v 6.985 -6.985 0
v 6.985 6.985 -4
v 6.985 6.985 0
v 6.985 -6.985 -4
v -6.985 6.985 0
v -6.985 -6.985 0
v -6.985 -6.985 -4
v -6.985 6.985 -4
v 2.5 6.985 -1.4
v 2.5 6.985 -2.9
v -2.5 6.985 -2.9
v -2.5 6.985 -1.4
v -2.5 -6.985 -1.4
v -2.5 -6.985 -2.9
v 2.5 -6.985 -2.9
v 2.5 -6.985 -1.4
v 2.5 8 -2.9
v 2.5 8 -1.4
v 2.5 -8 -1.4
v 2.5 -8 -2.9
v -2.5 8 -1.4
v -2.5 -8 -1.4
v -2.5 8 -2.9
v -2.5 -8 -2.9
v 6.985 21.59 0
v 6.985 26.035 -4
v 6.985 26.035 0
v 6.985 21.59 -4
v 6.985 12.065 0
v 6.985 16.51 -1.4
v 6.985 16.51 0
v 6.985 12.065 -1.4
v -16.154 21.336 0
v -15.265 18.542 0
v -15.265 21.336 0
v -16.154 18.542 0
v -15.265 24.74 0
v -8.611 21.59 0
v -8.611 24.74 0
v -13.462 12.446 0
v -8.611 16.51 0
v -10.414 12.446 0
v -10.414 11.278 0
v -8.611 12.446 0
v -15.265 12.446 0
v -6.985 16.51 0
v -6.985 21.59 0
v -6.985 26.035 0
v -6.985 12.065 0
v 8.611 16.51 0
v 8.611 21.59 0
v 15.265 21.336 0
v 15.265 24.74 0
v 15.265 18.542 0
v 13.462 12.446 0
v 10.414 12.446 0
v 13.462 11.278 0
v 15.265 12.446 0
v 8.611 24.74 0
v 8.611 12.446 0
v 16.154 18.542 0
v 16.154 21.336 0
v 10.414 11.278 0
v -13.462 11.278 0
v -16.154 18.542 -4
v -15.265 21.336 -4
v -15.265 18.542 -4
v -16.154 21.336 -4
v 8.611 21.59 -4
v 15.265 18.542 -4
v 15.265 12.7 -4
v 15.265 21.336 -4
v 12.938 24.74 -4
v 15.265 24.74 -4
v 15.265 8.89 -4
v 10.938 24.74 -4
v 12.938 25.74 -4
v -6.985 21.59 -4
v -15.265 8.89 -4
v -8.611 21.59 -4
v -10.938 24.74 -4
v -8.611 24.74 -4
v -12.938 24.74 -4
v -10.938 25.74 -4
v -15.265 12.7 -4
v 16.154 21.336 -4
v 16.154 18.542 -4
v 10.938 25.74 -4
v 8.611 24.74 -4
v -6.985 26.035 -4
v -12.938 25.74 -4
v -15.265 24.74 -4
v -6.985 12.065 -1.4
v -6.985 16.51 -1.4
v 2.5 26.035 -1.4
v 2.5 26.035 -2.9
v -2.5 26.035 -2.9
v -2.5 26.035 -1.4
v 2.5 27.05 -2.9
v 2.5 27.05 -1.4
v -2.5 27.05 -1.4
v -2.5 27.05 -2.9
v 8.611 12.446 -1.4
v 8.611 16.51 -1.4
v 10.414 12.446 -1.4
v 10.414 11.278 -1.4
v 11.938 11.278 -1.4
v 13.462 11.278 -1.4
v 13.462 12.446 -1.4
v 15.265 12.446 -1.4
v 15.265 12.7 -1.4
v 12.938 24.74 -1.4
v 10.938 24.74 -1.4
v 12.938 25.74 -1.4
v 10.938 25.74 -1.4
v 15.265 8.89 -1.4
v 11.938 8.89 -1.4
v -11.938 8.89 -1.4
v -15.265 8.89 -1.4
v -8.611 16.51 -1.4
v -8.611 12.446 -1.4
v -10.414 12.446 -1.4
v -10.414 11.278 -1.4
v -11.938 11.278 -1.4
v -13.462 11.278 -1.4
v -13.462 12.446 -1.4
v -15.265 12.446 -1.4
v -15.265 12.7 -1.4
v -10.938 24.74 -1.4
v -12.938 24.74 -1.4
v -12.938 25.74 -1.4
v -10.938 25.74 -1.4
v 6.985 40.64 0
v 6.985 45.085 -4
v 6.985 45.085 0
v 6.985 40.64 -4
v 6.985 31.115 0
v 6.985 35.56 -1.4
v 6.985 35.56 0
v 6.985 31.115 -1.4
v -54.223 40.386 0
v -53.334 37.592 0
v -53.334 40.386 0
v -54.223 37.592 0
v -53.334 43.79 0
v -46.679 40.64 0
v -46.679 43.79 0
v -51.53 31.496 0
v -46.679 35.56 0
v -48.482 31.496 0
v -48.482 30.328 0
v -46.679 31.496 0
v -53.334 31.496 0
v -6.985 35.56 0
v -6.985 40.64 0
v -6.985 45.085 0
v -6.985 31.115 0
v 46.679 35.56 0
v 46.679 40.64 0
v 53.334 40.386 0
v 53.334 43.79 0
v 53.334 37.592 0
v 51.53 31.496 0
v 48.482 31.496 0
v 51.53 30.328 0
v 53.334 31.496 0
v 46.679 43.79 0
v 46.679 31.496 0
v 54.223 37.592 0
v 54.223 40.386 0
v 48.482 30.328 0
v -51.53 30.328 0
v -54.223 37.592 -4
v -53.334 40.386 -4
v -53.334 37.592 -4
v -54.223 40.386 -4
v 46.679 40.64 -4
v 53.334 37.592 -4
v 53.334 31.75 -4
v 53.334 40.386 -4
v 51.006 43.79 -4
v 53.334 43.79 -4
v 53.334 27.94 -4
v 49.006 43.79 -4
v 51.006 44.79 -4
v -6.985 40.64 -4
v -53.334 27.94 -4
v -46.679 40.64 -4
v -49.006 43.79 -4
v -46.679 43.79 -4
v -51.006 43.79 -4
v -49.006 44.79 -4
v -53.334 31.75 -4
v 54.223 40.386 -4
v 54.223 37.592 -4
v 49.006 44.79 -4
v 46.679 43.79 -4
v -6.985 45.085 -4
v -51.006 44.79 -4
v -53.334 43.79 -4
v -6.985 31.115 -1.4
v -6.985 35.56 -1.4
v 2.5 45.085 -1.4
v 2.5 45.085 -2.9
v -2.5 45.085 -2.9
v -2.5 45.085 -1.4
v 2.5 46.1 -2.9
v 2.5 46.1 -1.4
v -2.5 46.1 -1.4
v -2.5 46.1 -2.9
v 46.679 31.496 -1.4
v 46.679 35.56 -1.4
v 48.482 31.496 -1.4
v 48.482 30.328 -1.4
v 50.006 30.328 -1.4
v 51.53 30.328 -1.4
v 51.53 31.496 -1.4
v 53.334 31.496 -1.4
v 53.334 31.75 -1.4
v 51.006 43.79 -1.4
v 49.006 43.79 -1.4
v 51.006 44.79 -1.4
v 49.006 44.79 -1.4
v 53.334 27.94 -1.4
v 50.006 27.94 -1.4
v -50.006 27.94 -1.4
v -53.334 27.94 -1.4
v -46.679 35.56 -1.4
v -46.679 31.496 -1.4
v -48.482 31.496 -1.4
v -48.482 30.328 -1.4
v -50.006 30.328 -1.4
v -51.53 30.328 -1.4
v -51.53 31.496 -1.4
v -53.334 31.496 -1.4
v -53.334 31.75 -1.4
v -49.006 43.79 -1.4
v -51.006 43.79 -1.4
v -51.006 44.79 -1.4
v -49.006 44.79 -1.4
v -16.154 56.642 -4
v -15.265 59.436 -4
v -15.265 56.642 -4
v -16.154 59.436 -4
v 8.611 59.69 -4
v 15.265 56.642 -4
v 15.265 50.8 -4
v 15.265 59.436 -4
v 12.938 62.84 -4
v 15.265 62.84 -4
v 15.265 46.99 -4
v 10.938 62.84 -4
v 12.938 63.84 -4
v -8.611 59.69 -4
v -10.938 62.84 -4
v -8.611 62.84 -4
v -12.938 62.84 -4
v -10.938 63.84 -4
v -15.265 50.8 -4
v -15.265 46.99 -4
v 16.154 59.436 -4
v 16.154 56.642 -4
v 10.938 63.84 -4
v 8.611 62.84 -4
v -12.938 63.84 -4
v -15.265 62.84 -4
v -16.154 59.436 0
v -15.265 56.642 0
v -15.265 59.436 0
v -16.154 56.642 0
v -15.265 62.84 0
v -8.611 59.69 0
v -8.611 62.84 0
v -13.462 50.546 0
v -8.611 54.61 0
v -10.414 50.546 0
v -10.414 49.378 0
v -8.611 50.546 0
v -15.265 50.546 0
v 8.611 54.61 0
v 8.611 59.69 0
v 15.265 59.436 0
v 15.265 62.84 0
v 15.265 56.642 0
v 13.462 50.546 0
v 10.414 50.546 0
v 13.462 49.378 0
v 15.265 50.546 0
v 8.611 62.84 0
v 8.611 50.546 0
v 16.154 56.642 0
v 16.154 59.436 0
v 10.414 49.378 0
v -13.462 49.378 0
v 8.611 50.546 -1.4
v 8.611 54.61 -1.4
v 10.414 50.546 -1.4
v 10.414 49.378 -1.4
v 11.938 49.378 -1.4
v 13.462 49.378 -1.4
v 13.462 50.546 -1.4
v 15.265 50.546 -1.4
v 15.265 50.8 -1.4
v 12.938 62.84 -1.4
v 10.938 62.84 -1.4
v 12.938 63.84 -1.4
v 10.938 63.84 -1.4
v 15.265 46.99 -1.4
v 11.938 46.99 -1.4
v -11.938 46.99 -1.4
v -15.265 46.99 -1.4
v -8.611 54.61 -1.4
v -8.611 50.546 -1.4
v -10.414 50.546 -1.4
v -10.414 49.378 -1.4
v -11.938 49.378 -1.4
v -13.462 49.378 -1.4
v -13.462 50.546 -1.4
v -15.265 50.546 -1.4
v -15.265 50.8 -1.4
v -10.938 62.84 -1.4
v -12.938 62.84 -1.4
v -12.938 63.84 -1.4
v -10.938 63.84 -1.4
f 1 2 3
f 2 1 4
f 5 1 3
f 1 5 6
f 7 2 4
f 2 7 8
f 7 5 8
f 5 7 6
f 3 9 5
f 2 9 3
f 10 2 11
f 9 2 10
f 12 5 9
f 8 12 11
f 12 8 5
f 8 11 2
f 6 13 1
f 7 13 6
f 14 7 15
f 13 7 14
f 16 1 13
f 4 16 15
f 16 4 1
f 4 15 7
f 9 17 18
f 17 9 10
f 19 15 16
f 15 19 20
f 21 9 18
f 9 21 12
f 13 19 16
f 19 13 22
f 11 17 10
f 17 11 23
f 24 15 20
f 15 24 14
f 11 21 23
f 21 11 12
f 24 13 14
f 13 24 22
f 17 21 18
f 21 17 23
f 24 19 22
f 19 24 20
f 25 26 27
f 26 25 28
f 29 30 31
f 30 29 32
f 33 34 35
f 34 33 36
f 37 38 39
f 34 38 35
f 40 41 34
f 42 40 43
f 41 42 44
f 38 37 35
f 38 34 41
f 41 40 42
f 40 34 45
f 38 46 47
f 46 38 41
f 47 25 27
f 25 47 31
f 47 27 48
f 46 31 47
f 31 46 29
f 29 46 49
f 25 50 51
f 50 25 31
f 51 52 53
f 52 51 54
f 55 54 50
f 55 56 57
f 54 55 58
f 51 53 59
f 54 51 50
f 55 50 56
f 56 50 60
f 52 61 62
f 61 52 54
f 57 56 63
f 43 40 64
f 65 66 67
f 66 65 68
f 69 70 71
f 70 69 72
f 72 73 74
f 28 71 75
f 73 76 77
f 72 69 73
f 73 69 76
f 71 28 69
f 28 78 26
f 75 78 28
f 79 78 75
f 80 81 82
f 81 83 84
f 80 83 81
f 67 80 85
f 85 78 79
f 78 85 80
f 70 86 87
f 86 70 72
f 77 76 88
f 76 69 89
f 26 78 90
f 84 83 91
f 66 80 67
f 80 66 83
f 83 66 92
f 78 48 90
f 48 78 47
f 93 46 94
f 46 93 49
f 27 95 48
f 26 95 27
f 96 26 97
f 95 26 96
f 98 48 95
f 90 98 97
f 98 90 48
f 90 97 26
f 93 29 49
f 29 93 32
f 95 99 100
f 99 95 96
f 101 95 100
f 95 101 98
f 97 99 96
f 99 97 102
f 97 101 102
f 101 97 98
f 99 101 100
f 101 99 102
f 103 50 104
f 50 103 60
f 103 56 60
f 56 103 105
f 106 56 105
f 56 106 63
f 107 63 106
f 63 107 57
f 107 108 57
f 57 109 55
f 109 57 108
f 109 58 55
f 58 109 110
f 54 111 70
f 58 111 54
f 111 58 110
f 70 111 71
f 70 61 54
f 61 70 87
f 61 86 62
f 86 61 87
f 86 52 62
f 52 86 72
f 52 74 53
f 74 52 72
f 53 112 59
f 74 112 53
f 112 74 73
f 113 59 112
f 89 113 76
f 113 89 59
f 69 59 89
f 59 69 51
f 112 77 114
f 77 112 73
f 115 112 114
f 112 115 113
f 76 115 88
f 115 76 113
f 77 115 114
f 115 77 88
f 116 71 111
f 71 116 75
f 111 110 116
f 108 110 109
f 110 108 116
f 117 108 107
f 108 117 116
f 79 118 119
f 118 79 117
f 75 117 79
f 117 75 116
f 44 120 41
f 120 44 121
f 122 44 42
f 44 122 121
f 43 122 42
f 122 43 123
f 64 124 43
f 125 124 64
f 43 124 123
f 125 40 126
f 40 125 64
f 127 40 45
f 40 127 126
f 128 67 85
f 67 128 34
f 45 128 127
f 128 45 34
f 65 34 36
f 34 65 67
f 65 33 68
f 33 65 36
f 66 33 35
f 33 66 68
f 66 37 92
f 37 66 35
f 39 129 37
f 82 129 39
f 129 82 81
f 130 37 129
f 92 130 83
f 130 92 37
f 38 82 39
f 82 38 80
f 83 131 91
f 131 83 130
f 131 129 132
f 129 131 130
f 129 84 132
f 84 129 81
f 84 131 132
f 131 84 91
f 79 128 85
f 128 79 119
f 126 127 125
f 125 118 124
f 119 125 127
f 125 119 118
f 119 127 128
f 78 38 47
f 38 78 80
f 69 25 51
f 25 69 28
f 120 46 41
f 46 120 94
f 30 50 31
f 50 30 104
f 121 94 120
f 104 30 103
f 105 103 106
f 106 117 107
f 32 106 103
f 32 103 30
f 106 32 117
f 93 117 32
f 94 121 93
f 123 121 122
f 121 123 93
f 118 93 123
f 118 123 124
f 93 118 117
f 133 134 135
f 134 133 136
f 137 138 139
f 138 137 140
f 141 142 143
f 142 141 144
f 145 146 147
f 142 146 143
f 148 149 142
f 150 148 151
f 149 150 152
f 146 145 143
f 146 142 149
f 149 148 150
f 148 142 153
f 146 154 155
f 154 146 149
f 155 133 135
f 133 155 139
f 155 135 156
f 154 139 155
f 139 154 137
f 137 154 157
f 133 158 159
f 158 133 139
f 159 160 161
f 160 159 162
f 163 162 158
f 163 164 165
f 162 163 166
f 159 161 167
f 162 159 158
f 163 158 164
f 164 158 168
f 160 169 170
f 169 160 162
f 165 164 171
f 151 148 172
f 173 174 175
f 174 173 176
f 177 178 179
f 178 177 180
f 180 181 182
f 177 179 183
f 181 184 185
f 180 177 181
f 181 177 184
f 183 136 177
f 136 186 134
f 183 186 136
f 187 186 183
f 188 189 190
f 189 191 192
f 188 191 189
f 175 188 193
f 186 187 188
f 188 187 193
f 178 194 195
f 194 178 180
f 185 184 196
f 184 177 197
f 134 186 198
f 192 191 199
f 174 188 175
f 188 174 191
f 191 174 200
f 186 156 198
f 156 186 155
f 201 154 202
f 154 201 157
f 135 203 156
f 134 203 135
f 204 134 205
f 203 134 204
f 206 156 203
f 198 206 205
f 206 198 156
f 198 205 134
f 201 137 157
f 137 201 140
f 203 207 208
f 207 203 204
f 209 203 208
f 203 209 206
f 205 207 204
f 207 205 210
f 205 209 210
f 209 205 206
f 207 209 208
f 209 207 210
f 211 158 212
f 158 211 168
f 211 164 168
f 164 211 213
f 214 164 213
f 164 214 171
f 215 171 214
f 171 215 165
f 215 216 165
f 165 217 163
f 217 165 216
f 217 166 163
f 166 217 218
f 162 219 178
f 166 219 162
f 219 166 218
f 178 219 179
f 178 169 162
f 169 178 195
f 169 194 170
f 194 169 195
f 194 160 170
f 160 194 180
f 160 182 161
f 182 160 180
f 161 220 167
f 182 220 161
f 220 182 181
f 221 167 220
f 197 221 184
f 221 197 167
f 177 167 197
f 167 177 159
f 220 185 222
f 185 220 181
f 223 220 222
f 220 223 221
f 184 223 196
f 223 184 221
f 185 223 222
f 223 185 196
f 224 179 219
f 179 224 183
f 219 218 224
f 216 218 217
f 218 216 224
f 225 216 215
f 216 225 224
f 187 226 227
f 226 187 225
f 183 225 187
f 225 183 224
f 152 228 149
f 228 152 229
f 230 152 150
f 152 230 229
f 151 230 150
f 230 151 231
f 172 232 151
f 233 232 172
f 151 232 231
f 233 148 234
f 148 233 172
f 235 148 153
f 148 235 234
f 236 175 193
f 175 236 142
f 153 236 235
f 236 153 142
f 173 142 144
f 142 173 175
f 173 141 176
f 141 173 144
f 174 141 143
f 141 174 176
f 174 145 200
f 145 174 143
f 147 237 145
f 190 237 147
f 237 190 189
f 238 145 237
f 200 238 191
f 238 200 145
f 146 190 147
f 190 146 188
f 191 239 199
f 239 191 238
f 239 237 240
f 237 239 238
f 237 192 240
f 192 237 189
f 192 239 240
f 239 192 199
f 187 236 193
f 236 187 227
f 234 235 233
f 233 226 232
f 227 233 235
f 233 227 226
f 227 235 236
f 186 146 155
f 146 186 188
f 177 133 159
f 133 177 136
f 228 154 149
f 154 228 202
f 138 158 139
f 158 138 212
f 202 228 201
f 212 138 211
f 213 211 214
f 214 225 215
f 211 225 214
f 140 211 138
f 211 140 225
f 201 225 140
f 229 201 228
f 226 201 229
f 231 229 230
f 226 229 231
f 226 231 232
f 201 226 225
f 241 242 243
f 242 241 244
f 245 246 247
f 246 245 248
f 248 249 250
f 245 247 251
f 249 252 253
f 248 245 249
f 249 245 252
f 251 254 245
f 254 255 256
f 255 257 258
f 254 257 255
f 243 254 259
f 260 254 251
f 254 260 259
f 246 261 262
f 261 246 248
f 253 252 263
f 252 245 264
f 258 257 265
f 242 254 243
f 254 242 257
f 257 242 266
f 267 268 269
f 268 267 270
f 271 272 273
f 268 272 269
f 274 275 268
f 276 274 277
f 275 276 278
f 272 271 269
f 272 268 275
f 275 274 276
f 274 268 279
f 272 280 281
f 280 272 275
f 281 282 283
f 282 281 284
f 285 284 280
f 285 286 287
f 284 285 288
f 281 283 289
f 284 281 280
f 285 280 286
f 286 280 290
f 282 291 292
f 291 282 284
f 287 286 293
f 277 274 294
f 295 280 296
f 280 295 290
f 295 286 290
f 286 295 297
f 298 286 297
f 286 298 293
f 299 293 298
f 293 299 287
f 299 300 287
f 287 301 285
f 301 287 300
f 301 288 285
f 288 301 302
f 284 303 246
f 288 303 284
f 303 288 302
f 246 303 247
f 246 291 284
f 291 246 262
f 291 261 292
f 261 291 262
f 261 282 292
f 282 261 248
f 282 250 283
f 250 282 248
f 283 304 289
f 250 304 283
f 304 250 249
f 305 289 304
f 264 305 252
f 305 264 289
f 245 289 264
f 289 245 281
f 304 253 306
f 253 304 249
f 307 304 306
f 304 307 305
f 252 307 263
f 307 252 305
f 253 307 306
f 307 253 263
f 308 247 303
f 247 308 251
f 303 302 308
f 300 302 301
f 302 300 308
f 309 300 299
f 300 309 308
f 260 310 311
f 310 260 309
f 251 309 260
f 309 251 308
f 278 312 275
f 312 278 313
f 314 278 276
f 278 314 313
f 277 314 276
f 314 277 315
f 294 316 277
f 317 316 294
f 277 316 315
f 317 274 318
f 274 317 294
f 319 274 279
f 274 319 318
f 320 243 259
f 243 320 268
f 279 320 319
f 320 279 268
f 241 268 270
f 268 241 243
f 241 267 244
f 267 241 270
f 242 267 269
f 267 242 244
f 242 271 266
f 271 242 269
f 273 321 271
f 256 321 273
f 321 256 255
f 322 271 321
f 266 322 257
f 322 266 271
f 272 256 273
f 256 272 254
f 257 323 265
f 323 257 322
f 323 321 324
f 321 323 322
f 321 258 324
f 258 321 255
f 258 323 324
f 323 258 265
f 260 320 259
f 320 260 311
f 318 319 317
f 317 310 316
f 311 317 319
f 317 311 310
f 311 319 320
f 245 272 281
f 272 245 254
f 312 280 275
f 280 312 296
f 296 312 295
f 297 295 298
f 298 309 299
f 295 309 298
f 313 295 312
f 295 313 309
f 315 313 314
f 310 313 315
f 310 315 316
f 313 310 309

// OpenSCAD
//all units are in mm
//since datasheet units are in inches,
//there's a simple convertion function in()
//TODO:
//tolerance
//better names
//1u = 0,75"
//sets and offset in z axis for switch mounting cutouts
//0.1 is recommended
z_offset = 0.1;
switch_cutout_type = 0;
//simple conversion fuction inch to milimeters
function in(mm) = mm*25.4;
function u(unit) = unit*0.75;
//
module mirror_copy(v = [1, 0, 0])
{
    children();
    mirror(v) children();
}
//EXtendedCUBE
//allows to choose an axis on which the cube will be centered
module excube(a = [1,1,1],b = [0,0,0])
{
    translate([-b[0]*a[0]/2,-b[1]*a[1]/2,-b[2]*a[2]/2])
        cube(a);
}
//simple line
module line(start, end, thickness = 1) {
    hull() {
        translate(start) sphere(thickness);
        translate(end) sphere(thickness);
    }
}
//definition of single switch cutout
//with small cutout for switch's latch (maybe it could be smaller?)
//two types
module switch_part()
{
    if(switch_cutout_type)
        translate([0,0,-4])
            union()
            {
                excube([in(0.55),in(0.55),4], [1,1,0]);
                excube([5,16,2.5+z_offset], [1,1,0]);
            }
    else
        translate([0,0,-4])
            union()
            {
                excube([in(0.55),in(0.55),4], [1,1,0]);
                translate([0,0,1+z_offset])
                    excube([5,16,1.5], [1,1,0]);
            }
    
}
//definition of single cutout for stabiliser
//also with small cutout for switch's latch and bar section
module stabiliser_part()
{
    translate([0,0,-4])
        union()
        {
            linear_extrude(4)
                mirror_copy()
                    polygon(points=[
                        [in(0),-in(0.26+0.046)],
                        [-in(0.06),-in(0.26+0.046)],
                        [-in(0.06),-in(0.26)],
                        [-in(0.131),-in(0.26)],
                        [-in(0.131),-in(0.02)],
                        [-in(0.166),-in(0.02)],
                        [-in(0.166),in(0.11-0.02)],
                        [-in(0.131),in(0.11-0.02)],
                        [-in(0.131),in(0.224)],
                        [in(0),in(0.224)]]);
            translate([0,in(0.224),0])
                excube([2,2,2.5+z_offset], [1,1,0]);
            translate([0,-in(0.26)-in(0.14),0])
                excube([in(0.262),in(0.15),2.5+z_offset], [1,0,0]);
        }
}
//cutout definition for the rest of the stabiliser
module stabiliser_cutout(a = 0.94)
{
    union()
    {
        translate([0,0,-4])
            excube([in(a),in(0.2),4],[1,1,0]);
        translate([0,-in(0.26)-in(0.14),-4])
            excube([in(a),in(0.26)+in(0.14),2.5+z_offset],[1,0,0]);
    }
}
//------------------------------------------------
//switch assemblers

//accepts A diemension (distance between 
//centers of the stabiliser moutings)
module stabiliser(a = 0.94)
{
    mirror_copy()
        translate([in(a/2),0,0])
            stabiliser_part();
    stabiliser_cutout(a);
}
//still in progress, but should work for siple keys 
//1u , 2-2,75u , 6,25u spacebar
module switch(size = 1)
{
    //single switch
    if(size == 1)
    {
        switch_part();
    }
    else
    //there should be a better way
    if(size == 2 || size == 2.25 || size == 2.5 || size == 2.75)
    {
        union()
        {
            switch_part();
            stabiliser();
        }
    }
    //here too
    else
    {
        //size = (0.75*size)-0.75;
        //size = u(size)-u(1);
        //so far should work for 6.25u spacebar
        size = u(size-1);
        union()
        {
            switch_part();
            stabiliser(size);
        }
    }
}

module switch_asm(x, y, , size = 1, rotation = 0)
{
    translate([in(u(x)), in(u(y)), 0])
        rotate(a = rotation, v = [0, 0, 1])
            switch(size);
}
//test union, remove * to see
union()
{
    translate([0, 0, 0])
        switch();
    translate([0, in(u(1)), 0])
        switch(2);
    translate([0, in(u(2)), 0])
        switch(6.25);
    translate([0, in(u(3)), 0])
        stabiliser();
}

//switch_asm(0.5,0.5,2,90);

/*just some scrap to remove later
module switch_constructor(type)
    if(type == 6.25)
    {
        union()
        {
            switch();
            mirror_copy()
            translate([in(3.9375/2),0,0])
                stabiliser();
            stabiliser_cutout(3.9375);
        }
    }
*/
